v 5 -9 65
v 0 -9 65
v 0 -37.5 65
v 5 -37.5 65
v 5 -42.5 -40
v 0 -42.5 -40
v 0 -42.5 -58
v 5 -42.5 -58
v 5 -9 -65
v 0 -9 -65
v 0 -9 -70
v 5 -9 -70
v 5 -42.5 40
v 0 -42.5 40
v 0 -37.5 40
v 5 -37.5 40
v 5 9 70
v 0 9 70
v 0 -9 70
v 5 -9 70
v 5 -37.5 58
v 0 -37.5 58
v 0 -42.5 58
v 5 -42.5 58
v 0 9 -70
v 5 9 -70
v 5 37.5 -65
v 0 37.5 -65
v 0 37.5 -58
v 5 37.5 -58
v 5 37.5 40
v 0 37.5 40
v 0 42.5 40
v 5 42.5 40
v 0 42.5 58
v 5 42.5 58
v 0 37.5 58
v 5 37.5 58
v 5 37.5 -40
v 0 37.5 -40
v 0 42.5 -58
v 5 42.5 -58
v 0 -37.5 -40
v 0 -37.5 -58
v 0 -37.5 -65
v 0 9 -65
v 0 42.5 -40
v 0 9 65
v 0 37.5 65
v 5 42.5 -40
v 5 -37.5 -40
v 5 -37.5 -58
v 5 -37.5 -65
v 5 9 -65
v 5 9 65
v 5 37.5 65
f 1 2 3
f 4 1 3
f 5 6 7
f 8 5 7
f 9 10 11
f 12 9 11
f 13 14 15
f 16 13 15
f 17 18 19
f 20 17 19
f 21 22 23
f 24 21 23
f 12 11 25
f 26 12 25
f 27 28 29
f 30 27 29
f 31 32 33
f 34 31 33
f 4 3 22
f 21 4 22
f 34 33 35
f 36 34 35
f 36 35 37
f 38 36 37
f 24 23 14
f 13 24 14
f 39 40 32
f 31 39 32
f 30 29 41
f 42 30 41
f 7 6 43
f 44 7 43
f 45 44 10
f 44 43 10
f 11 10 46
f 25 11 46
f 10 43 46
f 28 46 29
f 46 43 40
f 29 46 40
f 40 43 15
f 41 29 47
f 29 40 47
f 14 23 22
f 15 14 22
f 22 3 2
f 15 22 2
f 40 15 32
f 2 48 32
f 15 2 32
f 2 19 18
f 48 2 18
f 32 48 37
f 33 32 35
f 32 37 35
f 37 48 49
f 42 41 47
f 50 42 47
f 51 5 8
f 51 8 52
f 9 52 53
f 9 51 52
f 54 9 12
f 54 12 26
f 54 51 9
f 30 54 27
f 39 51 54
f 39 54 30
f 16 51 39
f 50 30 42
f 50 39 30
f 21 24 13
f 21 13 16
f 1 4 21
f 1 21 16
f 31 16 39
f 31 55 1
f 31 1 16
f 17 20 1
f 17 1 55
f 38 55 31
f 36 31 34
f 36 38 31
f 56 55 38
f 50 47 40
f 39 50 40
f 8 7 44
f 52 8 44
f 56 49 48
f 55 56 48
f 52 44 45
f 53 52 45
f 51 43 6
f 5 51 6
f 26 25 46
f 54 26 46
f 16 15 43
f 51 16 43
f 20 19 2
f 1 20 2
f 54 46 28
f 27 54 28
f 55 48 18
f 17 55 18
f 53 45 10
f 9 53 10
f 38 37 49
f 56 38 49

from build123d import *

# Parameters (mm, degrees)
F1_DEPTH = 5


with BuildPart() as f1:
    # F0 (on Right) → F1 (new body)
    with BuildSketch(Plane.YZ):
        Polygon((37.5, 58), (37.5, 65), (9, 65), (9, 70), (-9, 70), (-9, 65), (-37.5, 65), (-37.5, 58), (-42.5, 58), (-42.5, 40), (-37.5, 40), (-37.5, -40), (-42.5, -40), (-42.5, -58), (-37.5, -58), (-37.5, -65), (-9, -65), (-9, -70), (9, -70), (9, -65), (37.5, -65), (37.5, -58), (42.5, -58), (42.5, -40), (37.5, -40), (37.5, 40), (42.5, 40), (42.5, 58), align=None)
    extrude(amount=F1_DEPTH)


solid = f1.part
